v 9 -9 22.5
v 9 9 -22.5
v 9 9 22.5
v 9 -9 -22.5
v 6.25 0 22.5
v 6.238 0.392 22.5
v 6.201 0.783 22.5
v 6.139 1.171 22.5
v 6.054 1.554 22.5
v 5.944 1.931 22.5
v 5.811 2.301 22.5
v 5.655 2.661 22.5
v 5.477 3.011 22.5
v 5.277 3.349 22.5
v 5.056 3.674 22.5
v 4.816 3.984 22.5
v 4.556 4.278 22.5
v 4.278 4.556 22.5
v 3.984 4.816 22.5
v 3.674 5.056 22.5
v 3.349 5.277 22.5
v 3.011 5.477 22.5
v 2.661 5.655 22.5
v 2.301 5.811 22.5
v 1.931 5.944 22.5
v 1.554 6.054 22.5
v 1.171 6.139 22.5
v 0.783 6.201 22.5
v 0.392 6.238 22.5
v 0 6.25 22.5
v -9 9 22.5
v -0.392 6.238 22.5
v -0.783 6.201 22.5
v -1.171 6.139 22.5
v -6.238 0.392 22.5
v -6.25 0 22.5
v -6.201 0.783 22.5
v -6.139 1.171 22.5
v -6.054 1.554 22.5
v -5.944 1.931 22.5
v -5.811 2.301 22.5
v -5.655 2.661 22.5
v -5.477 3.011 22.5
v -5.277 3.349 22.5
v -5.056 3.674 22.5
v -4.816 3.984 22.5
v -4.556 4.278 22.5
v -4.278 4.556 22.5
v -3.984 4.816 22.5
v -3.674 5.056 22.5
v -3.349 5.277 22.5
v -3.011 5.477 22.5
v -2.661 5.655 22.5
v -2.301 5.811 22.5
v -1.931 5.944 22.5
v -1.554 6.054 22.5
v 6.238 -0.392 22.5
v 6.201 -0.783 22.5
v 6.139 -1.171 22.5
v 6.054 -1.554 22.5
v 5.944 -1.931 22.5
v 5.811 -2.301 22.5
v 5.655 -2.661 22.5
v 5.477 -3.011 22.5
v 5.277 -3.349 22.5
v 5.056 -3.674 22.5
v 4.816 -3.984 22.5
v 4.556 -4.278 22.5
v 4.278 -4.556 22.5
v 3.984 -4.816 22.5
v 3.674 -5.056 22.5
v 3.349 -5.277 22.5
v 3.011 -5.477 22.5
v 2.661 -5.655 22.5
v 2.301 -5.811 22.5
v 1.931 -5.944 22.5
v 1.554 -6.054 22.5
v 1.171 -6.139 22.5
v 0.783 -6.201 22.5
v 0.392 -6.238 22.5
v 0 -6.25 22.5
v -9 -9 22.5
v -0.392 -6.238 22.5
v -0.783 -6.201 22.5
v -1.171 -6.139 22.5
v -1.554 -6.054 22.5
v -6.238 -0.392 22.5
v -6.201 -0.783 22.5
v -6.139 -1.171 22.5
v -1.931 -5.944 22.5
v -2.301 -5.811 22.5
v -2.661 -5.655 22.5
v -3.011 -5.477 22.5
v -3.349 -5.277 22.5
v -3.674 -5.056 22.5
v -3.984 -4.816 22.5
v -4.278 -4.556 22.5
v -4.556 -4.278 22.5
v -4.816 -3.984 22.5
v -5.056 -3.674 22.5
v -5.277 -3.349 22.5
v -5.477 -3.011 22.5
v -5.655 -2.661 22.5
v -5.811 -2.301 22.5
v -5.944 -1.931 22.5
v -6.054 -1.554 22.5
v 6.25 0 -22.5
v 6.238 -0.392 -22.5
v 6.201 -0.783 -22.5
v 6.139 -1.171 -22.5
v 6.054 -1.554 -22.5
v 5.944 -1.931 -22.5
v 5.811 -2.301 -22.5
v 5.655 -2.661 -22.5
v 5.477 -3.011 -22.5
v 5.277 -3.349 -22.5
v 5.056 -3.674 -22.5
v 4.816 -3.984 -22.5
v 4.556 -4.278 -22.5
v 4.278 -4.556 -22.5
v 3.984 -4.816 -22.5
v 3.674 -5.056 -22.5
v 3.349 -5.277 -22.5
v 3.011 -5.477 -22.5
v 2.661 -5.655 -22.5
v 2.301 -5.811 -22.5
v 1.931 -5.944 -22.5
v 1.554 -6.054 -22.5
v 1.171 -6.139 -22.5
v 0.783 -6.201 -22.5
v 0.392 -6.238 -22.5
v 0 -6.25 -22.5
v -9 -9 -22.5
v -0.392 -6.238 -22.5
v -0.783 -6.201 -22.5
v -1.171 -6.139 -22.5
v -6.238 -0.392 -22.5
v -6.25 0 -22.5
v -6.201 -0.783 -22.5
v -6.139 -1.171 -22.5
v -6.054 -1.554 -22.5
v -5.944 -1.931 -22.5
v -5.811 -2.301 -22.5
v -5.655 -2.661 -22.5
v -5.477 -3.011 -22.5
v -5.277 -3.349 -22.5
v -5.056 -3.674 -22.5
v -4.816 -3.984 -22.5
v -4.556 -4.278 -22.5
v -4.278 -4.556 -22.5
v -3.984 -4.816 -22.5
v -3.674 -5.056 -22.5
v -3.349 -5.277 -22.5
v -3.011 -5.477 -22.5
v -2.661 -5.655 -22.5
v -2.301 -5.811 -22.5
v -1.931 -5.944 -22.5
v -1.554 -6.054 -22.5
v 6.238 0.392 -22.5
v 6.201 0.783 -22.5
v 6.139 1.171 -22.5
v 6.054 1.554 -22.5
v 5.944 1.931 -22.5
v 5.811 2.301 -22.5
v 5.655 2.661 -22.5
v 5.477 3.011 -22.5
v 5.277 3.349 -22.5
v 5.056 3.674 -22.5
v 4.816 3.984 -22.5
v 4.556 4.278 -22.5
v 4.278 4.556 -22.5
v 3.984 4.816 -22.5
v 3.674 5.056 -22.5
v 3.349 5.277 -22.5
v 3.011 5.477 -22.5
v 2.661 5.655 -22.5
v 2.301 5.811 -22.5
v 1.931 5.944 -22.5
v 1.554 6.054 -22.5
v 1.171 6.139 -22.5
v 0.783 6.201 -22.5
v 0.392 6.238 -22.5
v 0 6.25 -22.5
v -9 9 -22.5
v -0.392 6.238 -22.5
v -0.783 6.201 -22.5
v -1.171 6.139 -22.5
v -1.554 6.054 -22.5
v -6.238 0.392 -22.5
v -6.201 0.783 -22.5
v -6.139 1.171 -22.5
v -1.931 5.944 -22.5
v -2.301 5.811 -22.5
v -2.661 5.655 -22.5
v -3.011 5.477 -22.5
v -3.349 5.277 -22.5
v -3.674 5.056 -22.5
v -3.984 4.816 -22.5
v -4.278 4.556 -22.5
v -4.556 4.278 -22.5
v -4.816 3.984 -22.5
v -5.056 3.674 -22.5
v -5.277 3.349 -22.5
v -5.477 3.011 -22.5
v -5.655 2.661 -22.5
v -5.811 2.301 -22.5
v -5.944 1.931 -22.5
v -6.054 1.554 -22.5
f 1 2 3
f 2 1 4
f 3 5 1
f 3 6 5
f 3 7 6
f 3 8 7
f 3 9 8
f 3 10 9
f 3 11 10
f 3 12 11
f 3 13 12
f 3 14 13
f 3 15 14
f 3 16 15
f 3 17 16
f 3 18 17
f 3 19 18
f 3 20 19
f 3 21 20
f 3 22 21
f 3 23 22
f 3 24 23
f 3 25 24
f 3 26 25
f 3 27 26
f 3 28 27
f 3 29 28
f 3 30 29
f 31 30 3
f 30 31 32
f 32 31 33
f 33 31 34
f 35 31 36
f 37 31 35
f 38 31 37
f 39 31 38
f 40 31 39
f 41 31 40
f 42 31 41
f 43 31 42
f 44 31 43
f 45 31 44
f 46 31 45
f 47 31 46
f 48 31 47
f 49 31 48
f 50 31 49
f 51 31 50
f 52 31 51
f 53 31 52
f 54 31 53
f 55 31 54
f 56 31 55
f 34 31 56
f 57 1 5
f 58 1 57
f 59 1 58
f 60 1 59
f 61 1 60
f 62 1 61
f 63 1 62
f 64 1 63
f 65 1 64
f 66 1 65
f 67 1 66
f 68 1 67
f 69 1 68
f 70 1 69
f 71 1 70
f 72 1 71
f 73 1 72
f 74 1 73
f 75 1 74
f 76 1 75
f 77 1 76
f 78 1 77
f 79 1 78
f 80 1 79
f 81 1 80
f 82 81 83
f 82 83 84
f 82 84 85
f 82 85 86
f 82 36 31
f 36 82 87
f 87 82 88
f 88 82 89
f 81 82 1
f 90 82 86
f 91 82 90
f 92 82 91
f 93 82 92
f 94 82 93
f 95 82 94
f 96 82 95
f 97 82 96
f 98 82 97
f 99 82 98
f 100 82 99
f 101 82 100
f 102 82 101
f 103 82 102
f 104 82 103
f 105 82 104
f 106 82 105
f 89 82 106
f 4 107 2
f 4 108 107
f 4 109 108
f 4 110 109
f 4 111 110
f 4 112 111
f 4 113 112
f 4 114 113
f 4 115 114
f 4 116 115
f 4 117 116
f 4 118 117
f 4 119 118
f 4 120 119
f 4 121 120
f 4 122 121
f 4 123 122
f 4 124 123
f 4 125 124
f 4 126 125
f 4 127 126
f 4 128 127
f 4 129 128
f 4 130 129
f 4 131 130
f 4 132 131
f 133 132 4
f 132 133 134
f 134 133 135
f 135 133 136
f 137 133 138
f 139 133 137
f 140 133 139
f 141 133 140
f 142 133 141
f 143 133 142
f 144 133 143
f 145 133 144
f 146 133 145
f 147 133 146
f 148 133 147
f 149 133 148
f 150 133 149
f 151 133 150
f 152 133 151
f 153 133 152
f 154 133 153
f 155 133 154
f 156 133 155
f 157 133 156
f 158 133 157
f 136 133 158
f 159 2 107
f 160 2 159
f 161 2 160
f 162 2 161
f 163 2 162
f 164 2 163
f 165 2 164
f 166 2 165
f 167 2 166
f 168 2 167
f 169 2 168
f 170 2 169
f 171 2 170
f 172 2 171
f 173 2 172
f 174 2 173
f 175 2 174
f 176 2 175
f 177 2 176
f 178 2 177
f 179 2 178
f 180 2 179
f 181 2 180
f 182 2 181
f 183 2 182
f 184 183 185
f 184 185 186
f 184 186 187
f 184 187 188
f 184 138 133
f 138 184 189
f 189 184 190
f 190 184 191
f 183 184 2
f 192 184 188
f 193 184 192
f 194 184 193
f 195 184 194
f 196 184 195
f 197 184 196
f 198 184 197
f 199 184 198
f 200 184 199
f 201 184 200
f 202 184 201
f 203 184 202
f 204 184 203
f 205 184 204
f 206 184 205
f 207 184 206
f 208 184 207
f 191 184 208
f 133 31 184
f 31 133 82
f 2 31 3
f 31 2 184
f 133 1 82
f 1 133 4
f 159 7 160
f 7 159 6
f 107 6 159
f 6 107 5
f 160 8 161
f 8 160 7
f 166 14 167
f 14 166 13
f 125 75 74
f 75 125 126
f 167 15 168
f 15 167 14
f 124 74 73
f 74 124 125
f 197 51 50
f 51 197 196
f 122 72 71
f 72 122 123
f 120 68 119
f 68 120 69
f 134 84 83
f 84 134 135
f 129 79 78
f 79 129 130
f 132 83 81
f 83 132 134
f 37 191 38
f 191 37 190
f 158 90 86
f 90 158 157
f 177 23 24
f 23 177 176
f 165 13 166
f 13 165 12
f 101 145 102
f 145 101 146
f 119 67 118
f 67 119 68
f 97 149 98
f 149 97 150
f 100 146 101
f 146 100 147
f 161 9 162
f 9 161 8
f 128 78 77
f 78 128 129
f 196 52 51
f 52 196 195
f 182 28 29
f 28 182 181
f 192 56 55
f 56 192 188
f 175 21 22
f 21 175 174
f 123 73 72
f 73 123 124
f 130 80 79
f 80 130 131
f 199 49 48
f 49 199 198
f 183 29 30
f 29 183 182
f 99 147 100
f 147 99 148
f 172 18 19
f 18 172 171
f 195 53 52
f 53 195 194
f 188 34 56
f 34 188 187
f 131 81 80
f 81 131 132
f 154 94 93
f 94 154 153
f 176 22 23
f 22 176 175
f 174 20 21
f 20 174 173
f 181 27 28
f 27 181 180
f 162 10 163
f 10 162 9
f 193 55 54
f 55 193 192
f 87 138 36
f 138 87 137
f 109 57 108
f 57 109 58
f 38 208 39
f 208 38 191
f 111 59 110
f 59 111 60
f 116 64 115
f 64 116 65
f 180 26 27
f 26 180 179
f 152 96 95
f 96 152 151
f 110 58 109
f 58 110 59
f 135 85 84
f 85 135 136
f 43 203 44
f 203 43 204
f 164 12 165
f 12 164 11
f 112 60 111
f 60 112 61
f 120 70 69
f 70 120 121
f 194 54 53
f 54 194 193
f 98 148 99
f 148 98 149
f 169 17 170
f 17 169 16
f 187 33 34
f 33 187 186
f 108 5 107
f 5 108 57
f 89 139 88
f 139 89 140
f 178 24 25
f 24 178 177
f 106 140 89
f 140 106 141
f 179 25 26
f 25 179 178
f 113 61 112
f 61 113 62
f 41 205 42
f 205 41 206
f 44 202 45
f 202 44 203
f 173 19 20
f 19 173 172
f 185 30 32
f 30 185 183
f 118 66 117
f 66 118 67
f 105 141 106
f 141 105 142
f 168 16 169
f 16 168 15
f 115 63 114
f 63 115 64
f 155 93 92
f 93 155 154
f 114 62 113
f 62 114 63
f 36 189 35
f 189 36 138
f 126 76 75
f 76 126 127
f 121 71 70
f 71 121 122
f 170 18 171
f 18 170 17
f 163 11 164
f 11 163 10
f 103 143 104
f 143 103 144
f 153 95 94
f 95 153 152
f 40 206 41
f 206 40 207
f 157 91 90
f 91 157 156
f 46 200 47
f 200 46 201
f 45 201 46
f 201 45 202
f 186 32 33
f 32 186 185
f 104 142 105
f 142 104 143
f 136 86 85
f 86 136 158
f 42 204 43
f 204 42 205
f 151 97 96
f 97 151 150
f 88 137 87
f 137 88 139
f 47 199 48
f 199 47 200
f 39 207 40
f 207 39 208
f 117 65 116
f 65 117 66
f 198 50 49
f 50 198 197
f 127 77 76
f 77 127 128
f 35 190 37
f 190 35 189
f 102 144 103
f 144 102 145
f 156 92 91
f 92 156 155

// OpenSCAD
$fn = 100;

//Main parameters to tune : Configured for MatterControl
$Rail6mmDiameter = 6.2;//Hole for X 6mm rail attachments to Y carriages and Y rails to base supports - Good
$LeadScrewAttachHoleDiameter = 16.3;//Leadscrew block hole for T-threads
$VerticalLockClearance = .4;//Delta between vertical threaded hole and free hole
$HorizontlLockClearance = .35;//Delta between horizontal threaded hole and free hole
$LockScrewBoreM2_5Vertical = 2.4;//3D printed vertical hole for M2.5 threadlock - Good
$LockScrewBoreM2_5Horizontal = 2.3;//3D printed horizontal hole for M2.5 threadlock
$LockScrewBoreM3Vertical = 3.0;
$LockScrewBoreM3_5Vertical = 3.4;
$LockScrewBoreM3Horizontal = 2.85;
$LockScrewBoreM8Vertical = 7.8;//Vertical M8 threadlocked hole - Good
$Shaft3mmHorizontal = 3.05;
$Bearing8mmDiameter = 22.2;
$LockScrewBoreM2_5Laser = 2.2;//Laser mounting holes for leadscrew block and limit switches
$LockScrewBoreM3Laser = 2.7;
$LockScrewBoreM2Laser = 1.7;//Laser hole size for M2 thread locking
$Bearing6mmDiameter = 12.2;
$XMotorMountSpacing = 11.5;
$BearingShaftDiameter = 8.1;
$XMotorMountExtension = 4; // Extend the X motor Y plate mounting hole lengths to accomodate different motors

$PlateClearance = .15;

$AcrylicThickness = 3.0;
$BaseAcrylicThickness = 10;
$AlignmentAcrylicThickness = 1.5;


$BaseAcrylicColor = [0.1, 0.5, 0.0, 0.9];
$FrameAcrylicColor = [0.7, 0.8, 0.2, 0.9];
$AlignmentAcrylicColor = [0.3, 0.7, 0.7, 0.4];
$BaseAcrylicColor = [0.1, 0.1, 0.5, 0.6];

$YPosition = 130;
$XPosition = 150;

$RoundToHex = 1.155;

$XRailSpacing = 300;
$CarrierSpacing = 40;
$CarrierZOffset = 14;
$LaserCarrierWidth = 58;
$LaserCarrierLength = 68;
$XRailLength = 300;
$YRailLength = 270;

module RodClamp()
{
  //width = width of main block
  //height = height of main block
  //depth = depth of main block
  //boreheight = height of center of shaft from base
  //boreradius = radius of bore
  //gapwidth = width of clamp gap
  //screwbore = bore hole radius for clamp screw
  //screwstyle = 0-hex side aligned, 1-hex top aligned, 2-round
  //captivestyle = 0-hex side aligned, 1-hex top aligned, 2-square open to top, 3-hex base open top
  //captivebore = bore hole radius of captive nut
  //captivedepth = thicknes of captuve nut
  //screwoffset = height of clamp screw hole delta from centered

  upper = (height - boreheight - boreradius);

//    screwoffset = (upper / 2) + boreradius;
    screwheight = (upper / 2) + boreradius + screwoffset;

  difference()
  {
    translate([-width/2, -depth/2, -boreheight])
      cube([width, depth, height]);
    rotate(90, [1, 0, 0])
      cylinder(r = boreradius, h = depth + 0.1, center = true);
    translate([0, -(depth + 0.1) / 2, 0])
      rotate(-45, [0, 1, 0])
      cube([boreradius, depth + 0.1, boreradius]);
    translate([-gapwidth / 2, -(depth + 0.1) / 2, 0])
    cube([gapwidth, depth + 0.1, height - boreheight + 0.1]);

    translate([0, 0, screwheight])
    {
      rotate(90, [0, 1, 0])
        if (screwstyle == 0)
          cylinder(r = screwbore, h = width + 0.1, center = true, $fn = 6);
        else if (screwstyle == 1)
          rotate(30, [0, 0, 1])
          cylinder(r = screwbore / 0.866025, h = width + 0.1, center = true, $fn = 6);
        else if (screwstyle == 2)
          cylinder(r = screwbore / 0.866025, h = width + 0.1, center = true);
      translate([((width - captivedepth) / 2) + 0.1, 0, 0])
      {
      if (captivestyle == 0)
        rotate(90, [0, 1, 0])
          cylinder(r = captivebore / 0.866025, h = captivedepth + 0.1, center = true, $fn = 6);
      else if (captivestyle == 1)
        rotate(90, [0, 1, 0])
          rotate(30, [0, 0, 1])
            cylinder(r = captivebore / 0.866025, h = captivedepth + 0.1, center = true, $fn = 6);
      else if (captivestyle == 2)
        translate([0, 0, ((upper + (captivebore * 2)) / 4) - ((captivebore * 2)/ 1.8)])
        cube([captivedepth + 0.1, captivebore * 2, ((upper + (captivebore * 2)) / 1.8)], center = true);
      else if (captivestyle == 3)
      {
        translate([0, 0, ((upper + captivebore) / 4)])
        cube([captivedepth + 0.1, captivebore * 2, ((upper + captivebore) / 1.7)], center = true);
        rotate(90, [0, 1, 0])
          cylinder(r = captivebore / 0.866025, h = captivedepth + 0.1, center = true, $fn = 6);
      }
      }
    }
  }
}

module LaserCarrier()
{
  translate([-31, -38.5, -7])
  difference()
  {
    //Base mount
    cube([$LaserCarrierWidth, $LaserCarrierLength, 21]);
    //Mechanism opening
    translate([4, 4, -0.1])
      cube([$LaserCarrierWidth - 8, 68 - 8, 21.2]);
//    //FPC opening, horizontal
//    translate([-1, 23.5, -0.1])
//      cube([20, 30, 5]);
    //Rail support 1
    translate([-0.1, 11, 3])
      rotate(90, [0, 1, 0])
        rotate(30, [0, 0, 1])
          cylinder(d = $Shaft3mmHorizontal * $RoundToHex, h = 70, $fn = 6);
    //Rail support 2
    translate([-0.1, 11 + 48, 3])
      rotate(90, [0, 1, 0])
        rotate(30, [0, 0, 1])
          cylinder(d = $Shaft3mmHorizontal * $RoundToHex, h = 70, $fn = 6);
  }
}

module SideRailClamp()
{
  difference()
  {
    rotate(90, [0, 0, 1])
      RodClamp(width = 15, height = 21, screwoffset = 0, depth = 18, boreheight = 6, boreradius = ($Rail6mmDiameter / 2), gapwidth = 0, screwbore = 0, screwstyle = 0, captivestyle = 0, captivebore = 0, captivedepth = 0);
    //Rail clamp hole
    //Thread locked section
    cylinder(d = $LockScrewBoreM2_5Vertical, h = 25);
    //Screw head countersink section
    translate([0, 0, 7])
      cylinder(d = 6.3, h = 25);
    //Top plate mounting holes
    translate([0, 5, -5])
      cylinder(d = $LockScrewBoreM2_5Vertical, h = 25);
    translate([0, -5, -5])
      cylinder(d = $LockScrewBoreM2_5Vertical, h = 25);
  }
}

module SideRailCarriage()
{
  //Lower side rail rider for bearing
  RodClamp(width = 18, height = 18, screwoffset = 0, depth = 55, boreheight = 10, boreradius = ($Bearing6mmDiameter / 2), gapwidth = 0, screwbore = 0, screwstyle = 0, captivestyle = 0, captivebore = 0, captivedepth = 1.5);
  translate([0, -$CarrierSpacing / 2, $CarrierZOffset])
    SideRailClamp();
  difference()
  {
    translate([0, $CarrierSpacing / 2, $CarrierZOffset])
      SideRailClamp();
    translate([0, 27.5, 28])
      rotate(90, [0, 1, 0])
        rotate(-90, [1, 0, 0])
          LimitSwitchHoles();
  }
}

module BeltClampHolePairVertical()
{
  translate([0, 0, -7])
    rotate(-90, [0, 1, 0])
      cylinder(d = $Bore, h = 20);
  translate([0, 0, 8])
    rotate(-90, [0, 1, 0])
      cylinder(d = $Bore, h = 20);
}

module XCarriageFixedDiode()
{
  difference()
  {
    union()
    {
      translate([-7, $CarrierSpacing / 2, $CarrierZOffset])
        rotate(90, [0, 0, 1])
          difference()
          {
            RodClamp(width = 18, height = 25, screwoffset = 0, depth = 50, boreheight = 14, boreradius = ($Bearing6mmDiameter / 2), gapwidth = 0, screwbore = 0, screwstyle = 0, captivestyle = 0, captivebore = 0, captivedepth = 1.5);
            //Belt clamp holes
            translate([-1.8, 21, 0])
              BeltClampHolePairVertical($Bore = $LockScrewBoreM2_5Horizontal);
            translate([-1.8, -21, 0])
              BeltClampHolePairVertical($Bore = $LockScrewBoreM2_5Horizontal);
           }
      translate([-7, -$CarrierSpacing / 2, $CarrierZOffset - 0])
      {
        rotate(90, [0, 0, 1])
          RodClamp(width = 18, height = 23, screwoffset = 0, depth = 40, boreheight = 14, boreradius = ($Bearing6mmDiameter / 2), gapwidth = 0, screwbore = 0, screwstyle = 0, captivestyle = 0, captivebore = 0, captivedepth = 1.5);
      }

      //Limit switch bumper
      translate([16, 26.5, 0])
        cube([17, 6, 25]);

      //Diode mounting block and runner support
      translate([-22, -12, 0])
      cube([30, 24, 12]);
    }
    
    //Bearing lock screw holes
    translate([0, 34, 14])
      rotate(90, [1, 0, 0])
        cylinder(d = $LockScrewBoreM2_5Horizontal, h = 10);
    translate([0, -24, 14])
      rotate(90, [1, 0, 0])
        cylinder(d = $LockScrewBoreM2_5Horizontal, h = 10);

	//Diode mounting hole
      translate([-7, 6, -0.01])
	cylinder(d1 = 12.25, d2 = 12.0, h = 13);
        
  }
}



module XCarriage()
{
  difference()
  {
    union()
    {
      translate([-7, $CarrierSpacing / 2, $CarrierZOffset])
        rotate(90, [0, 0, 1])
          difference()
          {
            RodClamp(width = 18, height = 25, screwoffset = 0, depth = $LaserCarrierLength, boreheight = 14, boreradius = ($Bearing6mmDiameter / 2), gapwidth = 0, screwbore = 0, screwstyle = 0, captivestyle = 0, captivebore = 0, captivedepth = 1.5);
            //Belt clamp holes
            translate([0, 23, 0])
              BeltClampHolePairVertical($Bore = $LockScrewBoreM2_5Horizontal);
            translate([0, -15, 0])
              BeltClampHolePairVertical($Bore = $LockScrewBoreM2_5Horizontal);
           }
      translate([-7, -$CarrierSpacing / 2, $CarrierZOffset - 0])
      {
        rotate(90, [0, 0, 1])
          RodClamp(width = 18, height = 23, screwoffset = 0, depth = $LaserCarrierLength, boreheight = 14, boreradius = ($Bearing6mmDiameter / 2), gapwidth = 0, screwbore = 0, screwstyle = 0, captivestyle = 0, captivebore = 0, captivedepth = 1.5);
      }

      //Laser carrier
      translate([-11.5,2, -10])
        rotate(90, [0, 0, 1])
          LaserCarrier();

      //Limit switch bumper
      translate([23, 26.5, -17])
        cube([4, 6, 42]);
    }
    //FPC opening, vertical
    translate([-($LaserCarrierLength / 2) - 10, -12, -2])
      cube([$LaserCarrierLength + 10, 24, 40]);
    
    //Bearing lock screw holes
    translate([-10, 20, 20])
      cylinder(d = $LockScrewBoreM3Vertical, h = 10, $fn = 30);
    translate([0, -24, 14])
      rotate(90, [1, 0, 0])
        cylinder(d = $LockScrewBoreM3Vertical * $RoundToHex, h = 10, $fn = 6);

    //Belt clamp access holes
    //Lower
//    translate([-22, 8, 7])
//      rotate(95, [1, 0, 0])
//        cylinder(d = 6, h = 55, $fn = 6);
    translate([8, 8, 7])
      rotate(95, [1, 0, 0])
        cylinder(d = 6, h = 55, $fn = 6);
    //Upper
//    translate([-22, 8, 22])
//      rotate(81.5, [1, 0, 0])
//        cylinder(d = 6, h = 55, $fn = 6);

//    translate([8, 8, 22])
//      rotate(81.5, [1, 0, 0])
//        cylinder(d = 6, h = 55, $fn = 6);

    translate([8, -15, 22.1])
      cube([6, 40, 6], center = true);
//      rotate(90, [1, 0, 0])
//#        cylinder(d = 6, h = 55, $fn = 6);
        
    //Clearance for motor pulley
    translate([13, 10, 7.9])
      cube([15, 16.1, 27]);
    //Clearance for belt 
    translate([-48, -32, 3.9])
      cube([30, 26.1, 27]);
  }
}

module YRailClampTall()
{
  translate([0,0, 20])
  difference()
  {
    RodClamp(width = 18, height = 56, screwoffset = 2, depth = 10, boreheight = 46, boreradius = ($Rail6mmDiameter / 2), gapwidth = 0, screwbore = 0, screwstyle = 1, captivestyle = 1, captivebore =0, captivedepth = 1.5);
    //Spacer/Y drive shaft bearing plate holes
    translate([5, 10, 7])
      rotate(90, [1, 0, 0])
        cylinder(d = ($LockScrewBoreM3Horizontal + $HorizontlLockClearance) * $RoundToHex, h = 20, $fn = 6);
    translate([-5, 10, 7])
      rotate(90, [1, 0, 0])
        cylinder(d = ($LockScrewBoreM3Horizontal + $HorizontlLockClearance) * $RoundToHex, h = 20, $fn = 6);
    translate([5, 10, -12])
      rotate(90, [1, 0, 0])
        cylinder(d = ($LockScrewBoreM3Horizontal + $HorizontlLockClearance) * $RoundToHex, h = 20, $fn = 6);
    translate([-5, 10, -12])
      rotate(90, [1, 0, 0])
        cylinder(d = ($LockScrewBoreM3Horizontal + $HorizontlLockClearance)  * $RoundToHex, h = 20, $fn = 6);
    //Top mounting lock screw hole
    cylinder(d = $LockScrewBoreM2_5Vertical, h = 20);
  }
  //Mounting base
  translate([-(32 / 2), -5, -26])
  {
    difference()
    {
      cube([32, 10, 10]);
      translate([3, 5, -1])
        cylinder(d = $LockScrewBoreM3Vertical + $VerticalLockClearance, h = 20);
      translate([32 - 3, 5, -1])
        cylinder(d = $LockScrewBoreM3Vertical + $VerticalLockClearance, h = 20);
    }
  }
}

module YRailClamp()
{
  difference()
  {
    RodClamp(width = 18, height = 36, screwoffset = 2, depth = 10, boreheight = 26, boreradius = ($Rail6mmDiameter / 2), gapwidth = 0, screwbore = 0, screwstyle = 1, captivestyle = 1, captivebore =0, captivedepth = 1.5);
    //Spacer/Y drive shaft bearing plate holes
    translate([5, 10, 7])
      rotate(90, [1, 0, 0])
        cylinder(d = ($LockScrewBoreM3Horizontal + $HorizontlLockClearance) * $RoundToHex, h = 20, $fn = 6);
    translate([-5, 10, 7])
      rotate(90, [1, 0, 0])
        cylinder(d = ($LockScrewBoreM3Horizontal + $HorizontlLockClearance) * $RoundToHex, h = 20, $fn = 6);
    translate([5, 10, -12])
      rotate(90, [1, 0, 0])
        cylinder(d = ($LockScrewBoreM3Horizontal + $HorizontlLockClearance) * $RoundToHex, h = 20, $fn = 6);
    translate([-5, 10, -12])
      rotate(90, [1, 0, 0])
        cylinder(d = ($LockScrewBoreM3Horizontal + $HorizontlLockClearance)  * $RoundToHex, h = 20, $fn = 6);
    //Top mounting lock screw hole
    cylinder(d = $LockScrewBoreM2_5Vertical, h = 20);
  }
  //Mounting base
  translate([-(32 / 2), -5, -26])
  {
    difference()
    {
      cube([32, 10, 10]);
      translate([3, 5, -1])
        cylinder(d = $LockScrewBoreM3Vertical + $VerticalLockClearance, h = 20);
      translate([32 - 3, 5, -1])
        cylinder(d = $LockScrewBoreM3Vertical + $VerticalLockClearance, h = 20);
    }
  }
}

/*
module PlateHoleSet()
{
  translate([4, 20, 4])
    rotate(90, [1, 0, 0])
      cylinder(d = $LockScrewBoreM3Laser + $PlateClearance, h = 30);
  translate([14, 20, 4])
    rotate(90, [1, 0, 0])
      cylinder(d = $LockScrewBoreM3Laser + $PlateClearance, h = 30);
  translate([4, 20, 23])
    rotate(90, [1, 0, 0])
      cylinder(d = $LockScrewBoreM3Laser + $PlateClearance, h = 30);
  translate([14, 20, 23])
    rotate(90, [1, 0, 0])
      cylinder(d = $LockScrewBoreM3Laser + $PlateClearance, h = 30);
  translate([9, 20, 16])
    rotate(90, [1, 0, 0])
      cylinder(d = 6.5, h = 30);
}
*/

module PlateHoleSet()
{
  translate([4, 4])
      circle(d = $LockScrewBoreM3Laser + $PlateClearance);
  translate([14, 4])
      circle(d = $LockScrewBoreM3Laser + $PlateClearance);
  translate([4, 23])
      circle(d = $LockScrewBoreM3Laser + $PlateClearance);
  translate([14, 23])
      circle(d = $LockScrewBoreM3Laser + $PlateClearance);
  translate([9, 16])
      circle(d = 6.5, h = 30);
}

/*
module YPlateMotorHoles()
{
  translate([15.5, 0, 15.5])
    rotate(90, [1, 0, 0])
      cylinder(d = $MountBore, h = 15);
  translate([-15.5, 0, 15.5])
    rotate(90, [1, 0, 0])
      cylinder(d = $MountBore, h = 15);
  translate([15.5, 0, -15.5])
    rotate(90, [1, 0, 0])
      cylinder(d = $MountBore, h = 15);
  translate([-15.5, 0, -15.5])
    rotate(90, [1, 0, 0])
      cylinder(d = $MountBore, h = 15);
}
*/

module YPlateMotorHoles2D()
{
  translate([15.5, 15.5])
      circle(d = $MountBore);
  translate([-15.5, 15.5])
      circle(d = $MountBore);
  translate([15.5, -15.5])
      circle(d = $MountBore);
  translate([-15.5, -15.5])
      circle(d = $MountBore);
}

module YPlateMotorHoles()
{
  rotate(90, [1, 0, 0])
    linear_extrude(height = 15, center = false, convexity = 10, twist = 0)
      YPlateMotorHoles2D();
}

/*
module YPlate()
{
  color($FrameAcrylicColor)
  translate([-9, -$AcrylicThickness - 5, -16])
  {
    intersection()
    {
      difference()
      {
        cube([$XRailLength + 18, $AcrylicThickness, 86]);
        //Left mounting holes
        PlateHoleSet();
        translate([$XRailLength, 0, 0])
          PlateHoleSet();
        //Lower arch
        translate([($XRailLength / 2) + 9, 10, (-700 / 2) + 30])
          rotate(90, [1, 0, 0])
            cylinder(d = 700, h = 15);//, $fn = 200);
        //Y shaft bearing mounting
        translate([($XRailLength / 2) + 9, 10, 57])
        {
          //Shaft opening
          rotate(90, [1, 0, 0])
            cylinder(d = $ShaftDiameter, h = 15);
          //Mounting screw holes
          YPlateMotorHoles($MountBore = $LockScrewBoreM3Laser + $PlateClearance);
        }
      }
      //Upper arch
      translate([($XRailLength / 2) + 9, 10, (-550 / 2) + 78])
        rotate(90, [1, 0, 0])
          cylinder(d = 550, h = 15);//, $fn = 200);
    }
  }
}
*/

module YPlate2D()
{
  translate([-9, -16])
  {
    intersection()
    {
      difference()
      {
        square([$XRailLength + 18, 86]);
        //Left mounting holes
        PlateHoleSet();
        translate([$XRailLength, 0, 0])
          PlateHoleSet();
        //Lower arch
        translate([($XRailLength / 2) + 9, (-700 / 2) + 30])
            circle(d = 700);
        //Y shaft bearing mounting
        translate([($XRailLength / 2) + 9, 57])
        {
          //Shaft opening
            circle(d = $ShaftDiameter);
          //Mounting screw holes
          YPlateMotorHoles2d($MountBore = $LockScrewBoreM3Laser + $PlateClearance);
        }
      }
      //Upper arch
      translate([($XRailLength / 2) + 9, (-550 / 2) + 78])
          circle(d = 550, h = 15);//, $fn = 200);
    }
  }
}

module YPlate()
{
  color($FrameAcrylicColor)
    linear_extrude(height = $AcrylicThickness, center = false, convexity = 10, twist = 0)
    {
      YPlate2D($ShaftDiameter = $ShaftDiameter);
    }
}

module YMotorMount()
{
  translate([21, -2, 21])
  {
    LeadScrewBearingBlock($Depth = 4);
    translate([0, -18, 0])
    {
      difference()
      {
        LeadScrewBearingBlock($Depth = 4);
        translate([-5, -3, 9])
          cube([10, 6, 15]);
      }
    }
    translate([20, -20, -66.5])
    difference()
    {
      cube([4, 22, 86.5]);
      rotate(-23, [1, 0, 0])
        translate([-.1, 2, 0])
          cube([5, 22, 86.5]);
    }
    
    translate([-24, -20, -66.5])
    difference()
    {
      cube([4, 22, 86.5]);
      rotate(-23, [1, 0, 0])
        translate([-.1, 2, 0])
          cube([5, 22, 86.5]);
    }
    
  }
}

module YMotor()
{
  color([.2, .2, .2])
    cube([42, 42, 42]);
  color([.6, .6, .6])
    translate([21, 0, 21])
      rotate(90, [1, 0, 0])
        cylinder(d = 22, h = 3);
  color([.7, .7, .7])
    translate([21, 0, 21])
      rotate(90, [1, 0, 0])
        cylinder(d = 5, h = 21);
  color([.7, .7, .7])
    translate([21, -16, 21])
      rotate(90, [1, 0, 0])
        cylinder(d = 19, h = 25);
}

module YCarriagePlateMountHoles()
{
  translate([9, 2.5, -1])
    cylinder(d = $LockScrewBoreM2_5Laser + $PlateClearance, h = 10);
  translate([9, 12.5, -1])
    cylinder(d = $LockScrewBoreM2_5Laser + $PlateClearance, h = 10);
  translate([9, 42.5, -1])
    cylinder(d = $LockScrewBoreM2_5Laser + $PlateClearance, h = 10);
  translate([9, 52.5, -1])
    cylinder(d = $LockScrewBoreM2_5Laser + $PlateClearance, h = 10);
  //Rail fix screw holes
  translate([9, 7.5, -1])
    cylinder(d = 6.3, h = 10);
  translate([9, 47.5, -1])
    cylinder(d = 6.3, h = 10);
}

module YCarriagePlateMountHoles2D()
{
  translate([9, 2.5])
    circle(d = $LockScrewBoreM2_5Laser + $PlateClearance);
  translate([9, 12.5])
    circle(d = $LockScrewBoreM2_5Laser + $PlateClearance);
  translate([9, 42.5])
    circle(d = $LockScrewBoreM2_5Laser + $PlateClearance);
  translate([9, 52.5])
    circle(d = $LockScrewBoreM2_5Laser + $PlateClearance);
  //Rail fix screw holes
  translate([9, 7.5])
    circle(d = 6.3);
  translate([9, 47.5])
    circle(d = 6.3);
}

module LimitSwitchHoles2D()
{
  translate([-5, 2.5])
    circle(d = $LockScrewBoreM2_5Laser);
  translate([-15, 2.5])
    circle(d = $LockScrewBoreM2_5Laser);
}

module YCoverPlate2D()
{
  difference()
  {
    //Base plate
  	square([$XRailSpacing + 18, 55]);
    //Y carriage mounting holes
    YCarriagePlateMountHoles2D();
    translate([$XRailSpacing, 0])
      YCarriagePlateMountHoles2D();
    //Motor mount openings
    translate([$XRailSpacing - 10, 32])
    {
    //Alignment collar
    translate([0, 0,0])
      hull()
      {
        translate([-5, 0])
          circle(d = 22);
        circle(d = 22);
      }
    //Mounting holes/screws. Note, longer so we can mount 2 different motor sizes
    translate([$XMotorMountSpacing + $XMotorMountExtension, $XMotorMountSpacing])
      hull()
      {
        translate([-5 - $XMotorMountExtension, 0])
          circle(d = 2.4);
        circle(d = 2.4);
      }
    translate([$XMotorMountSpacing + $XMotorMountExtension, -$XMotorMountSpacing])
      hull()
      {
        translate([-5 - $XMotorMountExtension, 0])
          circle(d = 2.4);
        circle(d = 2.4);
      }
    translate([-$XMotorMountSpacing, $XMotorMountSpacing])
      hull()
      {
        translate([-5 - $XMotorMountExtension, 0])
          circle(d = 2.4);
         circle(d = 2.4);
      }
    translate([-$XMotorMountSpacing, -$XMotorMountSpacing])
      hull()
      {
        translate([-5 - $XMotorMountExtension, 0])
          circle(d = 2.4);
        circle(d = 2.4);
      }
    }
    //Bearing shaft opening for bolt. No longer needed
//    translate([9, 26.5])
//      circle(d = 8);
    //Y rider mounting holes
    translate([(($XRailSpacing  + 18)/ 2) - 10, 5])
      circle(d = $LockScrewBoreM2_5Laser);
    translate([(($XRailSpacing  + 18)/ 2) + 10, 5])
      circle(d = $LockScrewBoreM2_5Laser);
    //Subtract limit switch mount holes
    translate([(($XRailLength  + 18)/ 2) + 40, 47])
//      rotate(180, [0, 1, 0])
        LimitSwitchHoles2D();
    
    //Belt clamp access opening
    translate([40, 16])
      square([26, 26]);
  }
}

module YCoverPlate()
{
  color($FrameAcrylicColor)
  linear_extrude(height = $AcrylicThickness, center = false, convexity = 10, twist = 0)
    YCoverPlate2D();
}

module YCoverPlate3D()
{
  color($FrameAcrylicColor)
  difference()
  {
    //Base plate
  	cube([$XRailLength + 18, 55, $AcrylicThickness]);
    //Y carriage mounting holes
    YCarriagePlateMountHoles();
    translate([$XRailLength, 0, 0])
      YCarriagePlateMountHoles();
    //Motor mount openings
    translate([$XRailLength - 10, 32, 2])
    {
    //Alignment collar
    translate([0, 0, -3])
      hull()
      {
        translate([-5, 0, 0])
          cylinder(d = 22, h = 5);
        cylinder(d = 22, h = 5);
      }
    //Mounting holes/screws
    translate([11.5, 11.5, -5])
      hull()
      {
        translate([-5, 0, 0])
          cylinder(d = 2.4, h = 70);
        cylinder(d = 2.4, h = 70);
      }
    translate([11.5, -11.5, -5])
      hull()
      {
        translate([-5, 0, 0])
          cylinder(d = 2.4, h = 70);
        cylinder(d = 2.4, h = 70);
      }
    translate([-11.5, 11.5, -5])
      hull()
      {
        translate([-5, 0, 0])
          cylinder(d = 2.4, h = 70);
         cylinder(d = 2.4, h = 70);
      }
    translate([-11.5, -11.5, -5])
      hull()
      {
        translate([-5, 0, 0])
          cylinder(d = 2.4, h = 70);
        cylinder(d = 2.4, h = 70);
      }
    }
    translate([9, 26.5, -1])
      cylinder(d = 8, h = 30);
    //Y rider mounting holes
    translate([(($XRailLength  + 18)/ 2) - 10, 5, -1])
      cylinder(d = $LockScrewBoreM2_5Laser + $PlateClearance, h = 30);
    translate([(($XRailLength  + 18)/ 2) + 10, 5, -1])
      cylinder(d = $LockScrewBoreM2_5Laser + $PlateClearance, h = 30);
    //Subtract limit switch mount holes
    translate([(($XRailLength  + 18)/ 2) + 40, 47, 9.46])
      rotate(180, [0, 1, 0])
        LimitSwitchHoles();
  }
}

module XStepper()
{
  //Main body
  color([0.3, 0.3, 0.3])
    translate([-14, -14, 0])
      cube([28, 28, 45]);
  //Shaft
  color([0.8, 0.8, 0.8])
    translate([0, 0, -20])
      cylinder(d = 5, h = 20);
  //Pulley
  translate([0, 0, 2.85 - $AcrylicThickness])
  color([0.8, 0.8, 0.8])
  {
    translate([0, 0, -12])
      cylinder(d = 12.9, h = 6);
    translate([0, 0, -12 - 7])
      cylinder(d = 9.6, h = 7);
    translate([0, 0, -12 - 7 - 1])
      cylinder(d = 12.9, h = 1);
  }
}

module LeadScrewRiderSmall()
{
  translate([0,  - 32.7, 0])
  color([0.8, 0.8, 0.83])
  {
    rotate(-90, [1, 0, 0])
      cylinder(d = 10, h = 15);
    translate([0, 1.6, 0])
      rotate(-90, [1, 0, 0])
      difference()
      {
        cylinder(d = 22, h = 3.6);
        translate([8, 0, -1])
        cylinder(d = 3.5, h = 6);
        translate([-8, 0, -1])
        cylinder(d = 3.5, h = 6);
        translate([0, 8, -1])
        cylinder(d = 3.5, h = 6);
        translate([0, -8, -1])
        cylinder(d = 3.5, h = 6);
      }
  }
}

module LeadScrewRiderLarge()
{
  translate([0,  - 32.7, 0])
  color([0.8, 0.8, 0.83])
  {
    rotate(-90, [1, 0, 0])
      cylinder(d = 15.7, h = 31);
    translate([0, 0, 0])
      rotate(-90, [1, 0, 0])
      difference()
      {
        cylinder(d = 30, h = 5);
        translate([11, 0, -1])
        cylinder(d = 3.5, h = 7);
        translate([-11, 0, -1])
        cylinder(d = 3.5, h = 7);
        translate([0, 11, -1])
        cylinder(d = 3.5, h = 7);
        translate([0, -11, -1])
        cylinder(d = 3.5, h = 7);
      }
  }
}

module LeadScrewRider()
{
  //LeadScrewRiderSmall();
  LeadScrewRiderLarge();
}

module BeltClamp()
{
  translate([-21, 5, 4.5])
  difference()
  {
    translate([0, 0, -1])
    cube([9, 6, 22]);
    translate([4.5, 8,9.5])
      rotate(90, [0, 0, 1])
        BeltClampHolePairVertical($Bore = $LockScrewBoreM2_5Vertical + $VerticalLockClearance + .5);
    translate([-1, 4.1, 8.5])
    cube([18, 2, 7]);
  }
  //Add gripper teeth
  for ($i = [1:4])
  {
    translate([($i * 2) - 21.5, 8, 12.2])
      rotate(45, [0, 0, 1])
        cube([1.5, 1.5, 8]);
  }
}

module LeftSideRailCarriage()
{
  difference()
  {
    SideRailCarriage();
    //Bearing cut out
    translate([-10, -15.4, 11])
      cube([20, 3, 10.5]);
    translate([-10, -15.4, 21.4])
      rotate(-35, [1, 0, 0])
        cube([20, 3, 5]);
  }
  //Bearing lower mount
  translate([-9, -15.4,8])
    cube([18, 29, 4.4]);
  translate([0, -1,7])
    cylinder(d1 = $BearingShaftDiameter, d2 = $BearingShaftDiameter, h = 14.5);
  translate([0, -1,21.5])
    cylinder(d1 = $BearingShaftDiameter, d2 = $BearingShaftDiameter - .5, h = 1);
  translate([0, -1,7])
    cylinder(d = $BearingShaftDiameter + 3, h = 5.9);
}

module LeadScrewBlock()
{
  translate([0, -22.5, 2])
  {
    difference()
    {
      translate([0, 0, -3])
        cube([40, 10, 18.3], center = true);
      translate([0, 0, -0.15 - $AcrylicThickness])
      {
      //Y rider opening
      rotate(90, [1, 0, 0])
        cylinder(d = $LeadScrewAttachHoleDiameter, h = 20, center = true);
      //Y rider mounting screw holes
      translate([-11, 0, 0])
        rotate(90, [1, 0, 0])
          cylinder(d = $LockScrewBoreM3_5Vertical, h = 20, center = true);
      translate([11, 0, 0])
        rotate(90, [1, 0, 0])
          cylinder(d = $LockScrewBoreM3_5Vertical, h = 20, center = true);
      }
      //YPlate mounting holes
      translate([-10, 0, -20])
        cylinder(d = ($LockScrewBoreM2_5Horizontal) * $RoundToHex, h = 15, $fn = 6);
      translate([10, 0, -20])
        cylinder(d = ($LockScrewBoreM2_5Horizontal) * $RoundToHex, h = 15, $fn = 6);
    }
  }
}

module LeadScrewBearingBlock()
{
  difference()
  {
    cube([40, $Depth, 40], center = true);
    translate([0, 6, 0])
    {
      YPlateMotorHoles($MountBore = $LockScrewBoreM3Vertical + $HorizontlLockClearance);    
      rotate(90, [1, 0, 0])
        cylinder(d = $Bearing8mmDiameter, h = 15);
    }
  }
}

/*
module BasePlateHoleSet()
{
  translate([7, 10, -1])
   cylinder(d = $LockScrewBoreM3Laser, h = 20);
  translate([33, 10, -1])
   cylinder(d = $LockScrewBoreM3Laser, h = 20);
}
*/

module BasePlateHoleSet()
{
  translate([7, 10])
   circle(d = $LockScrewBoreM3Laser);
  translate([33, 10])
   circle(d = $LockScrewBoreM3Laser);
} 


/*
module BaseRowHoleSet()
{
  BasePlateHoleSet();
  translate([0, $YRailLength, 0])
    BasePlateHoleSet();
  translate([0, $YRailLength - 10, 0])
    BasePlateHoleSet();
  translate([0, $YRailLength - 20, 0])
    BasePlateHoleSet();
}
*/

module BaseRowHoleSet()
{
  BasePlateHoleSet();
  translate([0, $YRailLength])
    BasePlateHoleSet();
  translate([0, $YRailLength - 10])
    BasePlateHoleSet();
}



/*
module BasePlate()
{
  color($BaseAcrylicColor)
  difference()
  {
    cube([$XRailLength + 40, $YRailLength + 20, $BaseAcrylicThickness]);
    BaseRowHoleSet();
    translate([$XRailLength, 0, 0])
      BaseRowHoleSet();
    translate([$XRailLength - 10, 0, 0])
      BaseRowHoleSet();
    translate([$XRailLength - 20, 0, 0])
      BaseRowHoleSet();
    translate([20, 10, 25])
    AlignmentBarSet($Type = 1);
  }
}
*/

module BasePlate()
{
  difference()
  {
    square([$XRailLength + 40, $YRailLength + 20]);
    BaseRowHoleSet();
    translate([$XRailLength, 0])
      BaseRowHoleSet();
    translate([$XRailLength - 10, 0])
      BaseRowHoleSet();
    translate([20, 10])
      AlignmentBarSet($Type = 1);
  }
}

module AlignmentHoles()
{
  for ($i = [0:(($Length - 20) / 30)])
  {
    translate([5, ($i * 30) + 10, -1])
      cylinder(d = $LockScrewBoreM2Laser, h = 10);
  }
}

/*
module AlignmentBar()
{
  if ($Type == 0)
  {
    cube([10, $Length, $AlignmentAcrylicThickness]);
  }
  else if ($Type == 1)
  {
    for ($i = [0:(($Length - 20) / 30)])
    {
      translate([5, ($i * 30) + 10, -1])
        cylinder(d = $LockScrewBoreM2Laser, h = 10);
    }
  }
  else if ($Type == 2)
  {
    for ($i = [0:(($Length - 20) / 30)])
    {
      translate([5, ($i * 30) + 10, -1])
        cylinder(d = $LockScrewBoreM2Laser + $PlateClearance, h = 10);
    }
  }
}
*/

module AlignmentBar()
{
  if ($Type == 0)
  {
    square([10, $Length]);
  }
  else if ($Type == 1)
  {
    for ($i = [0:(($Length - 20) / 30)])
    {
      translate([5, ($i * 30) + 10])
        circle(d = $LockScrewBoreM2Laser);
    }
  }
  else if ($Type == 2)
  {
    for ($i = [0:(($Length - 20) / 30)])
    {
      translate([5, ($i * 30) + 10])
        circle(d = $LockScrewBoreM2Laser + $PlateClearance);
    }
  }
}

/*
module AlignmentBarSet()
{
  //Left
  translate([10, 10, -26.01])
    AlignmentBar($Length = $YRailLength - 60, $Type = $Type);
  translate([40, 10, -26.01])
    AlignmentBar($Length = $YRailLength - 60, $Type = $Type);
  translate([70, 10, -26.01])
    AlignmentBar($Length = $YRailLength - 60, $Type = $Type);
  //Right
  translate([$XRailLength - 20, 10, -26.01])
    AlignmentBar($Length = $YRailLength - 60, $Type = $Type);
  translate([$XRailLength - 50, 10, -26.01])
    AlignmentBar($Length = $YRailLength - 60, $Type = $Type);
  translate([$XRailLength - 80, 10, -26.01])
    AlignmentBar($Length = $YRailLength - 60, $Type = $Type);
  //Top
  translate([35, $YRailLength - 5, -26.01])
    rotate(-90, [0, 0, 1])
      AlignmentBar($Length = $YRailLength - 70, $Type = $Type);
  translate([35, $YRailLength - 35, -26.01])
    rotate(-90, [0, 0, 1])
      AlignmentBar($Length = $YRailLength - 70, $Type = $Type);
  translate([35, $YRailLength - 65, -26.01])
    rotate(-90, [0, 0, 1])
      AlignmentBar($Length = $YRailLength - 70, $Type = $Type);
}
*/

module AlignmentBarSet()
{
  //Left
  translate([10, 10])
    AlignmentBar($Length = $YRailLength - 60, $Type = $Type);
  translate([40, 10])
    AlignmentBar($Length = $YRailLength - 60, $Type = $Type);
  translate([70, 10])
    AlignmentBar($Length = $YRailLength - 60, $Type = $Type);
  //Right
  translate([$XRailLength - 20, 10])
    AlignmentBar($Length = $YRailLength - 60, $Type = $Type);
  translate([$XRailLength - 50, 10])
    AlignmentBar($Length = $YRailLength - 60, $Type = $Type);
  translate([$XRailLength - 80, 10])
    AlignmentBar($Length = $YRailLength - 60, $Type = $Type);
  //Top
  translate([35, $YRailLength - 5])
    rotate(-90, [0, 0, 1])
      AlignmentBar($Length = $YRailLength - 70, $Type = $Type);
  translate([35, $YRailLength - 35])
    rotate(-90, [0, 0, 1])
      AlignmentBar($Length = $YRailLength - 70, $Type = $Type);
  translate([35, $YRailLength - 65])
    rotate(-90, [0, 0, 1])
      AlignmentBar($Length = $YRailLength - 70, $Type = $Type);
}

module AlignmentBars()
{
  difference()
  {
    AlignmentBarSet($Type = 0);
    AlignmentBarSet($Type = 2);
  }
}

module LimitSwitchHoles()
{
  translate([5, 2.5, -10])
    cylinder(d = $LockScrewBoreM2_5Laser, h = 30);
  translate([15, 2.5, -10])
    cylinder(d = $LockScrewBoreM2_5Laser, h = 30);
}

module LimitSwitch()
{
  difference()
  {
    color([0.3, 0.3, 0.3])
    cube([20, 10, 6.6]);
    LimitSwitchHoles();
  }
  color([0.7, 0.7, 0.7])
  translate([0, -1.8, 3.3])
  {
    translate([1.75, 0, 0])
      cube([0.5, 3.6, 3.4], center = true);
    translate([10, 0, 0])
      cube([0.5, 3.6, 3.4], center = true);
    translate([20-1.75, 0, 0])
      cube([0.5, 3.6, 3.4], center = true);
  }
  color([0.7, 0.7, 0.7])
    translate([3, 10, 1.3])
      rotate(10, [0, 0, 1])
        cube([17, .35, 4]);
}

module NewLaserCheck()
{
  translate([0, $YPosition, 0])
  {
    translate([$XPosition, 0, 0])
    {
      //Laser sled
      XCarriageFixedDiode();
    }
  }
  //Y carriage cover plate
  translate([-9, $YPosition - 27.5, 29])
    YCoverPlate();
  //X carriage belts
  color([0.1, 0.1, 0.1])
  {
    translate([0, $YPosition + 4.8 + 4.5, 13.4])
      cube([$XRailLength, 1.6, 6.2]);
    translate([0, $YPosition - 4.8 - 1.6 + 4.5, 13.4])
      cube([$XRailLength, 1.6, 6.2]);
  }
  //Belt clamps
  translate([$XPosition - 11.5, $YPosition, 0])
    BeltClamp();
  translate([$XPosition + 30.5, $YPosition, 0])
    BeltClamp();
  //Belt bearing
  translate([0, $YPosition - 1, 13])
    cylinder(d = 22, h = 7);

}

module DisplayAlignment()
{
  translate([0, $YPosition, 0])
  {
    //Y side rail carriages
    LeftSideRailCarriage();
    translate([$XRailSpacing, 0, 0])
    {
      SideRailCarriage();
      translate([0, 27.5, 28])
        rotate(90, [0, 1, 0])
          rotate(-90, [1, 0, 0])
            LimitSwitch();
    }
    //Carrier rails
    color([0.7, 0.7, 0.72])
    {
      translate([0, -$CarrierSpacing / 2, $CarrierZOffset])
        rotate(90, [0, 1, 0])
          cylinder(d = 6, h = $XRailLength);
      translate([0, $CarrierSpacing / 2, $CarrierZOffset])
        rotate(90, [0, 1, 0])
          cylinder(d = 6, h = $XRailLength);
    }
    translate([$XPosition, 0, 0])
    {
      //Laser sled
      XCarriage();
    }
  }
  //Y slider rails
  color([0.7, 0.7, 0.72])
  {
    rotate(-90, [1, 0, 0])
      cylinder(d = 6, h = $YRailLength);
    translate([$XRailSpacing, 0, 0])
      rotate(-90, [1, 0, 0])
        cylinder(d = 6, h = $YRailLength);
  }
  //Base Y rail clamps
  YRailClamp();
  translate([$XRailLength, 0, 0])
    YRailClamp();
  translate([0, $YRailLength, 0])
    YRailClamp();
  translate([$XRailLength, $YRailLength, 0])
    YRailClamp();
  //Y travel end plates
  translate([0, -5, 0])
    rotate(90, [1, 0, 0])
      YPlate($ShaftDiameter = 23);
  translate([0, 5 + $AcrylicThickness, 0])
    rotate(90, [1, 0, 0])
      YPlate($ShaftDiameter = 23);
  translate([0, $YRailLength - 5, 0])
    rotate(90, [1, 0, 0])
      YPlate($ShaftDiameter = 23);
  translate([0, 5 + $AcrylicThickness + $YRailLength, 0])
    rotate(90, [1, 0, 0])
      YPlate($ShaftDiameter = 23);
  //Y leadscrew
  color([0.8, 0.8, 0.83])
    translate([$XRailLength / 2, 0, 41])
      rotate(-90, [1, 0, 0])
        cylinder(d = 8, h = $YRailLength);
  //Y leadscrew rider
  translate([$XRailLength / 2, $YPosition, 41])
    LeadScrewRider();
  //Y movement motor
  translate([($XRailLength - 42) / 2, $YRailLength + 26 + $AcrylicThickness, 19.5])
  {
    YMotor();
    YMotorMount();
  }
  //Y carriage cover plate
  translate([-9, $YPosition - 27.5, 29])
    YCoverPlate();
  //X carriage stepper
  translate([$XRailLength - 25, $YPosition + 4.5, 29 + $AcrylicThickness])
    XStepper();
  //X carriage belts
  color([0.1, 0.1, 0.1])
  {
    translate([0, $YPosition + 4.8 + 4.5, 13.4])
      cube([$XRailLength, 1.6, 6.2]);
    translate([0, $YPosition - 4.8 - 1.6 + 4.5, 13.4])
      cube([$XRailLength, 1.6, 6.2]);
  }
  //Belt clamps
  translate([$XPosition, $YPosition, 0])
    BeltClamp();
  translate([$XPosition + 25, $YPosition, 0])
    BeltClamp();
  //Belt bearing
  translate([0, $YPosition - 1, 13])
    cylinder(d = 22, h = 7);
  //Y leadscrew attatch
  translate([$XRailLength / 2, $YPosition, 39.15 + $AcrylicThickness])
    LeadScrewBlock();
  //Leadscrew support block. Note, thinner than the rail supports so that the plates are not parallel, hence stronger.
  translate([$XRailLength / 2, 0, 41])
    LeadScrewBearingBlock($Depth = 8);
  //Motor support block
  translate([$XRailLength / 2, $YRailLength, 41])
    LeadScrewBearingBlock($Depth = 8);
  //Base plate
  color($BaseAcrylicColor)
    translate([-20, -10, -26 - $BaseAcrylicThickness])
      linear_extrude(height = $BaseAcrylicThickness, center = false, convexity = 10, twist = 0)
        BasePlate();
  //PCB alignment bars
  color($AlignmentAcrylicColor)
    translate([0, 0,  -26.01])
      linear_extrude(height = $AlignmentAcrylicThickness, center = false, convexity = 10, twist = 0)
        AlignmentBars();
  //Y travel limit switch
  translate([-9, $YPosition - 27.5, 26.15 + $AcrylicThickness])
    translate([(($XRailLength  + 18)/ 2) + 40, 47, 9.46])
      rotate(180, [0, 1, 0])
        LimitSwitch();

}

module HoleChecker()
{
  difference()
  {
    translate([5, -10])
    square([255, 20]);
    for ($i = [10 : 50])
    {
      translate([($i * $i) / 10, 0, 0])
      circle(d = $i / 10);
    }
  }
}

module PrintItems()
{
  //Leadscrew attach clamp
//  translate([92, 113, 27.5])
//    rotate(90, [1, 0, 0])
//      LeadScrewBlock();
  translate([12, 63, 27.5])
    rotate(90, [1, 0, 0])
      rotate(90, [0, 1, 0])
        LeadScrewBlock();
  //Base Y rail clamps : 4x
  translate([20, 0, 26])
  {
    translate([30, 59, 0])
      YRailClamp();
    translate([30, 70, 0])
      YRailClamp();
    translate([30, 81, 0])
      YRailClamp();
    translate([30, 92, 0])
      YRailClamp();
  }
  translate([126, 74, 10])
    LeftSideRailCarriage();
  translate([106, 74, 10])
    SideRailCarriage();
  translate([51, 75, 17])
    rotate(90, [0, 0, 1])
      XCarriage();
  //Note, thinner than the rail supports so that the plates are not parallel, hence stronger.
  translate([68, 13, 5])
    rotate(90, [1, 0, 0])
      LeadScrewBearingBlock($Depth = 8);
  translate([25, 13, 5])
    rotate(90, [1, 0, 0])
      LeadScrewBearingBlock($Depth = 8);
  translate([102, 101, -5])
    rotate(90, [1, 0, 0])
      BeltClamp();
  translate([102, 78, -5])
    rotate(90, [1, 0, 0])
      BeltClamp();
  translate([95, 45, 22])
    rotate(90, [1, 0, 0])    
      YMotorMount();      
  
}

module CalibrationPrint()
{
  //Vertical openings
  difference()
  {
    cube([50, 20, 10]);
    //Vertical locking holes
    translate([5, 5, -1])
      cylinder(d = $LockScrewBoreM2_5Vertical, h = 12, $fn = 50);
    translate([15, 5, -1])
      cylinder(d = $LockScrewBoreM3Vertical, h = 12, $fn = 50);
    translate([27, 10, -1])
      cylinder(d = $LockScrewBoreM8Vertical, h = 12, $fn = 50);
    //Vertical free holes
    translate([5, 15, -1])
      cylinder(d = $LockScrewBoreM2_5Vertical + $VerticalLockClearance, h = 12, $fn = 50);
    translate([15, 15, -1])
      cylinder(d = $LockScrewBoreM3Vertical + $VerticalLockClearance, h = 12, $fn = 50);
    //Leadscrew traveller
    translate([40, 10, -1])
        cylinder(d = $LeadScrewAttachHoleDiameter, h = 20);
  }
  //Horizontal openings
  translate([50, 0, 0])
  difference()
  {
    cube([30, 10, 20]);
    //3MM shaft
    translate([5, 20, 5])
      rotate(90, [1, 0, 0])
        cylinder(d = $Shaft3mmHorizontal * $RoundToHex, h = 70, $fn = 6);
    //M2.5 locking
    translate([15, 20, 5])
      rotate(90, [1, 0, 0])
        cylinder(d = $LockScrewBoreM2_5Horizontal * $RoundToHex, h = 70, $fn = 6);
    //M3 locking
    translate([25, 20, 5])
      rotate(90, [1, 0, 0])
        cylinder(d = $LockScrewBoreM3Horizontal * $RoundToHex, h = 70, $fn = 6);
    //Horizontal free holes
    //M2.5 free
    translate([15, 20, 15])
      rotate(90, [1, 0, 0])
        cylinder(d = ($LockScrewBoreM2_5Horizontal  + $HorizontlLockClearance)* $RoundToHex, h = 70, $fn = 6);
    //M3 free
    translate([25, 20, 15])
      rotate(90, [1, 0, 0])
        cylinder(d = ($LockScrewBoreM3Horizontal + $HorizontlLockClearance) * $RoundToHex, h = 70, $fn = 6);
  }
  //Bearing mount
  translate([89, 5, 10])
    RodClamp(width = 18, height = 20, screwoffset = 0, depth = 10, boreheight = 10, boreradius = ($Bearing6mmDiameter / 2), gapwidth = 0, screwbore = 0, screwstyle = 0, captivestyle = 0, captivebore = 0, captivedepth = 1.5);
  translate([105, 5, 6])
    RodClamp(width = 15, height = 20, screwoffset = 0, depth = 10, boreheight = 6, boreradius = ($Rail6mmDiameter / 2), gapwidth = 0, screwbore = 0, screwstyle = 0, captivestyle = 0, captivebore = 0, captivedepth = 0);
  //Bearing piller
  translate([24, 20, 0])
    cylinder(d = $BearingShaftDiameter + 3, h = 20);
  
  //Bearing/motor block
  translate([0, 20, 0])
  difference()
  {
    cube([30, 30, 10]);
    translate([15, 15, -1])
        cylinder(d = $Bearing8mmDiameter, h = 15);
  }
  
}

module AlignmentBarPiece()
{
  difference()
  {
    AlignmentBar($Length = $YRailLength - 60, $Type = 0);  
    AlignmentBar($Length = $YRailLength - 60, $Type = 2);  
  }
}

module LaserSet1()
{
  //Set 1
  BasePlate();
}

module LaserSet2()
{
  //Set 2
  translate([0, 0])
    YCoverPlate2D();
  translate([9, 73])
    YPlate2D($ShaftDiameter = 23);
  translate([9, 123])
    YPlate2D($ShaftDiameter = 23);
  translate([9, 173])
    YPlate2D($ShaftDiameter = 23);
  translate([9, 223])
    YPlate2D($ShaftDiameter = 23);
}

module LaserSet3()
{
  //Set 3
  translate([0, 0])
    AlignmentBarPiece();
  translate([11, 0])
    AlignmentBarPiece();
  translate([22, 0])
    AlignmentBarPiece();
}

module LaserAll()
{
  LaserSet1();
  translate([350, 0])
    LaserSet2();
  translate([670, 0])
    LaserSet3();  
}

module PrintNewBits()
{
XCarriageFixedDiode();

translate([60, -7, 0])
  rotate(180, [0, 0, 1])
    translate([30, 0, 5])
      rotate(90, [1, 0, 0])
	    YRailClampTall();

translate([-27, 4, 0])
  rotate(180, [0, 0, 1])
    translate([30, 0, 5])
      rotate(90, [1, 0, 0])
	    YRailClampTall();

translate([-20, 10, 0])
  rotate(90, [0, 0, 1])
    translate([30, 0, 5])
      rotate(90, [1, 0, 0])
	    YRailClampTall();

translate([-20, 10, 0])
  rotate(90, [0, 0, 1])
    translate([30, 0, 5])
      rotate(90, [1, 0, 0])
	    YRailClampTall();

translate([-20, -70, 0])
  rotate(90, [0, 0, 1])
    translate([30, 0, 5])
      rotate(90, [1, 0, 0])
	    YRailClampTall();


}

module LaserFocusTest()
{
	difference()
	{
		cube([18, 18, 45], center = true);
		cylinder(d = 12.5, h = 48, center = true);
}
}

/////////////////////////////////////////////////////////////////////////

//PrintItems();

//LaserAll(); 
//LaserSet3(); 

//DisplayAlignment();

//HoleChecker();

//CalibrationPrint();

//NewLaserCheck();

//PrintNewBits();

//XCarriageFixedDiode();

LaserFocusTest();
